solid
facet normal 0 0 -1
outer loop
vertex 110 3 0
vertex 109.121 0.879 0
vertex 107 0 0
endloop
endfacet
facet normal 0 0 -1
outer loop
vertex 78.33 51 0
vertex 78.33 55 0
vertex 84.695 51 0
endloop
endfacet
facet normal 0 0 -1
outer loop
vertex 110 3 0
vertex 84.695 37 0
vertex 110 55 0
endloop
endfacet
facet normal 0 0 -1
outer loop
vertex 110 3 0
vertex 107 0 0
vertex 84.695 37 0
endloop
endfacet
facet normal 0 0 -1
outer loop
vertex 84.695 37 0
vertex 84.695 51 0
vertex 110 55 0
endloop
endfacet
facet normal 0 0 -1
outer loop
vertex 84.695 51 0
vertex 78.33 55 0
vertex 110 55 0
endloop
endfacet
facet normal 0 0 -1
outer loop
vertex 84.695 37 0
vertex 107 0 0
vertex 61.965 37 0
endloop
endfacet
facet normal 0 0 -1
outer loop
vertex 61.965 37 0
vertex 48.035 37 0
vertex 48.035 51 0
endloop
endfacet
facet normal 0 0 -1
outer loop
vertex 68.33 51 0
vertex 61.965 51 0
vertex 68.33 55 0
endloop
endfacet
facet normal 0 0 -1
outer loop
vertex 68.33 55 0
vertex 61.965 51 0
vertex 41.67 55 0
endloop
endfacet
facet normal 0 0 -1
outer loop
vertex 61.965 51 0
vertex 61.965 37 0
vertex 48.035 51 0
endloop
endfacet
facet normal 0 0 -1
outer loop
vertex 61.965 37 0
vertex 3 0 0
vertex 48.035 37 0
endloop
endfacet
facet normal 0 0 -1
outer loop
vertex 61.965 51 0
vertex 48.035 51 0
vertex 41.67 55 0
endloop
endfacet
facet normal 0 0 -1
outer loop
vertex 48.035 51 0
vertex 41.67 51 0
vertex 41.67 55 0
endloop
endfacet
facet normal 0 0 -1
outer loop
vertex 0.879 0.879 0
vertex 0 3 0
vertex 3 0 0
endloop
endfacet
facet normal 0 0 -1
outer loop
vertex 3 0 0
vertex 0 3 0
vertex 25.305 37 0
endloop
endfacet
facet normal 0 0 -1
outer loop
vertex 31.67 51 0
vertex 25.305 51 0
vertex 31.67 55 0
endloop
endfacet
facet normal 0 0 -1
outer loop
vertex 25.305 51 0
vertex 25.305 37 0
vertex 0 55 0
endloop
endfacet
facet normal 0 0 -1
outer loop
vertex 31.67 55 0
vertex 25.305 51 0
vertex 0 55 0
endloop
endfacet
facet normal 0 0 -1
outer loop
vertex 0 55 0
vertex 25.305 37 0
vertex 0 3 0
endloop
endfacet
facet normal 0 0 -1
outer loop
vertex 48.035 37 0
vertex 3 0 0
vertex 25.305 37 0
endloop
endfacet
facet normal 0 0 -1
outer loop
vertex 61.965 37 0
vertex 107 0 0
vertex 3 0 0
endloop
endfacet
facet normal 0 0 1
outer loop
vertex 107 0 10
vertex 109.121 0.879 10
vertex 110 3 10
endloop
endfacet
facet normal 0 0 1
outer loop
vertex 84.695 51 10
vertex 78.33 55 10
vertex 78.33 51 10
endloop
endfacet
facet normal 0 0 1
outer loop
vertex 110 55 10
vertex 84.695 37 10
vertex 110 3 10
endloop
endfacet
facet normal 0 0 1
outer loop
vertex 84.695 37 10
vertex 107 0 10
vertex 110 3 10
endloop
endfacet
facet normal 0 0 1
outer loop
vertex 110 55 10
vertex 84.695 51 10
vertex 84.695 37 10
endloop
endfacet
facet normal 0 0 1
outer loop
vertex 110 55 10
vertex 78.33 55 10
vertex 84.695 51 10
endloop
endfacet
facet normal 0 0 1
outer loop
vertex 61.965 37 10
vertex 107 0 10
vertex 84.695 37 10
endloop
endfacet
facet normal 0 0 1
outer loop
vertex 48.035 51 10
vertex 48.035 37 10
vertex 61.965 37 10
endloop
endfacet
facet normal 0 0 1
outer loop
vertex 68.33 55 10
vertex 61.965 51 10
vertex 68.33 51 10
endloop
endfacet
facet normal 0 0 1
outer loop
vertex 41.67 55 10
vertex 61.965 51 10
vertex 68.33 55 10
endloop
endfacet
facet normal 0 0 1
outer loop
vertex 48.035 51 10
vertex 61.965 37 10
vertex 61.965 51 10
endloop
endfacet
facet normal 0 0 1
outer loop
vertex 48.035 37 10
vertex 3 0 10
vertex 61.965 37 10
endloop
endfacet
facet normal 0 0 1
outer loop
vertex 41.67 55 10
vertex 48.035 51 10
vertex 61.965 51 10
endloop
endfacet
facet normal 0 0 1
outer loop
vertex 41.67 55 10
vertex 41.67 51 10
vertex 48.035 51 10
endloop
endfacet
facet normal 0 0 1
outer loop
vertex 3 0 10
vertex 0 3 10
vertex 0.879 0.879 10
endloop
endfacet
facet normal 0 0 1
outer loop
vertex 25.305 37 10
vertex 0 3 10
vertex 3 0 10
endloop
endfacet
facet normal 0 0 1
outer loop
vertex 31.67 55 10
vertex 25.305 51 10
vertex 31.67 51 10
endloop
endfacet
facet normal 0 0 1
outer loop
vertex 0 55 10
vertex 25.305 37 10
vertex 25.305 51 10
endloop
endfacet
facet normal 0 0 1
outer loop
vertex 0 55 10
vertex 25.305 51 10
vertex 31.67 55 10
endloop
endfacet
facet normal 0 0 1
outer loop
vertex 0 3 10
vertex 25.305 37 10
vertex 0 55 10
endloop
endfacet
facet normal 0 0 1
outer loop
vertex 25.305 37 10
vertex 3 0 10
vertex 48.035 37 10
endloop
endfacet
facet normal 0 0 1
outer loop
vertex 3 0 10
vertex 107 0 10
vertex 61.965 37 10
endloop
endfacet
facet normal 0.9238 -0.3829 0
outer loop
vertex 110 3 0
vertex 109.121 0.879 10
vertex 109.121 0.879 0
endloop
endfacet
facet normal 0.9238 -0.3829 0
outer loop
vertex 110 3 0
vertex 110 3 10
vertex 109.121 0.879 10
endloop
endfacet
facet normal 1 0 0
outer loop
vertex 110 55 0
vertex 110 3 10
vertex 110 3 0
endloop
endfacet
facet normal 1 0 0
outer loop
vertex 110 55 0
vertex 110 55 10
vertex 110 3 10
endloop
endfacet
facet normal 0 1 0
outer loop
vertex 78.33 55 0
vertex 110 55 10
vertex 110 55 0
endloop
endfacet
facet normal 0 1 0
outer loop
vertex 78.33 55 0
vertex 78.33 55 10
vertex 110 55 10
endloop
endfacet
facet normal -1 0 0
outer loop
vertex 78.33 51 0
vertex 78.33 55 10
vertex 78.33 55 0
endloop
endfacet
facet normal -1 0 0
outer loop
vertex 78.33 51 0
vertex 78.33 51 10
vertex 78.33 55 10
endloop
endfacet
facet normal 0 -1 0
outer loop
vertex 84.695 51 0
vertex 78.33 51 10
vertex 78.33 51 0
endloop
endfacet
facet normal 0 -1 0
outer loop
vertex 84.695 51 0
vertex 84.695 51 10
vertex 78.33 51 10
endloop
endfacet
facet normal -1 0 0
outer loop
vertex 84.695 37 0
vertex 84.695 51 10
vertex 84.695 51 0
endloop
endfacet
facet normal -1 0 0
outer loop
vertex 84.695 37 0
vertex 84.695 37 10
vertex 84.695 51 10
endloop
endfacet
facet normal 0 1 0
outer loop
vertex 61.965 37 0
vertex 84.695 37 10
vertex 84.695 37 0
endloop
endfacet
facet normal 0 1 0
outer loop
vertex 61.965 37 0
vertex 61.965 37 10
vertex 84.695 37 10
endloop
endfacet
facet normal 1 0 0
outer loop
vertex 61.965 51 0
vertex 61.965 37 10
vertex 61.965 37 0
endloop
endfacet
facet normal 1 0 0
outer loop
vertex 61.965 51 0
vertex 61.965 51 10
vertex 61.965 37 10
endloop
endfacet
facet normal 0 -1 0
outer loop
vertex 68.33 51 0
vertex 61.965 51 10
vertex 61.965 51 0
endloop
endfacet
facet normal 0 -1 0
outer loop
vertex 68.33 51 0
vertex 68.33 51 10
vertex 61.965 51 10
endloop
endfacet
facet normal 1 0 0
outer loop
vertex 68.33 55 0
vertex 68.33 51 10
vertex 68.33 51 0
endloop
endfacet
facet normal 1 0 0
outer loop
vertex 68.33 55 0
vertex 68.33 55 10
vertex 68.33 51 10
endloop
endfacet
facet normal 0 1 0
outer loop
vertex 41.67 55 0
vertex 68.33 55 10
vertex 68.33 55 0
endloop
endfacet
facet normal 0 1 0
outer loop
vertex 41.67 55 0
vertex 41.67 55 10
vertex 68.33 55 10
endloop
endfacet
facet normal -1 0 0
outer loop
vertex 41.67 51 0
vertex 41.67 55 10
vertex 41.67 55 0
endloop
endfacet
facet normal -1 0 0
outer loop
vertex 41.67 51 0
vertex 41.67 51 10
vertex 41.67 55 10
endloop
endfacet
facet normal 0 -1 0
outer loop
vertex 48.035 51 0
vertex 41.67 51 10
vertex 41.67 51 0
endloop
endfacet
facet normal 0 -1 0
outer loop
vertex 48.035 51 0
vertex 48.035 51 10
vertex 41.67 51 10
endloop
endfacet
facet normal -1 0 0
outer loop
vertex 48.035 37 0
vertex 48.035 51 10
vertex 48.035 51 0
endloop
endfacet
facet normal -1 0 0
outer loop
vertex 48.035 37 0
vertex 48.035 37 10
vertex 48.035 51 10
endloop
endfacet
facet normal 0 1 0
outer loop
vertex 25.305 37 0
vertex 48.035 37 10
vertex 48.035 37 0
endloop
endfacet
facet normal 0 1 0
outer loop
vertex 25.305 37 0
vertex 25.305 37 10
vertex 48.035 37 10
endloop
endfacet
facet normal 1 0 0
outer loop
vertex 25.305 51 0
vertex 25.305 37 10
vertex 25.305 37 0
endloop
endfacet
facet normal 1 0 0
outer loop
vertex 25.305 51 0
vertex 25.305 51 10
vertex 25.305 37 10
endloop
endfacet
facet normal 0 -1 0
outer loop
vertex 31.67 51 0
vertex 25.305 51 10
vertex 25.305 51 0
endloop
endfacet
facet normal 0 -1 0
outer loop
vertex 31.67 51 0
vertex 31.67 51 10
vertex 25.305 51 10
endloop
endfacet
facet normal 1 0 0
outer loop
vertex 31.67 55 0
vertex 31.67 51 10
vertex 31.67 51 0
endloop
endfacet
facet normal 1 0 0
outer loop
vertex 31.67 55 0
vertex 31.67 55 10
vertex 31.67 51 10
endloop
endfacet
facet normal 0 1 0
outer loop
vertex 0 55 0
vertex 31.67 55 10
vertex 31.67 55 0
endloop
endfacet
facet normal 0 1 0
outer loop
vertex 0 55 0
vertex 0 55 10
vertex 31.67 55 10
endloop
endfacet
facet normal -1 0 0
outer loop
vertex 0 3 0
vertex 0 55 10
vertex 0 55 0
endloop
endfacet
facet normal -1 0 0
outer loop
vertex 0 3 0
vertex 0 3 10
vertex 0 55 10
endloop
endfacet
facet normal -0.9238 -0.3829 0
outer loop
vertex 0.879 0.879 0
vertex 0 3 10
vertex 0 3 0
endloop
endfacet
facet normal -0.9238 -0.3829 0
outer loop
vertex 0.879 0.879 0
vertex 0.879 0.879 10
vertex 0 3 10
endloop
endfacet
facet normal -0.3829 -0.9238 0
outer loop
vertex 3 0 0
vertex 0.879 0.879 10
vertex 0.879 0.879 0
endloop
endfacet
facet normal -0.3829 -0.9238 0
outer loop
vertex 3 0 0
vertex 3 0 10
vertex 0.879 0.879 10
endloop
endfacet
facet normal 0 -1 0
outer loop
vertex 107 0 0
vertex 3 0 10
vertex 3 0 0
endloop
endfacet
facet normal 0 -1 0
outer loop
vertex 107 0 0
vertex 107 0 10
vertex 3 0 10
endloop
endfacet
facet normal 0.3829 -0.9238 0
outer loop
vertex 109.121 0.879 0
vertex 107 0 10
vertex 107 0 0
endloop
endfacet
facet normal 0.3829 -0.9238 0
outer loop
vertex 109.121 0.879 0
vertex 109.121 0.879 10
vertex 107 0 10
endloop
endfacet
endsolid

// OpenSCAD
$fn = 32;

// ----------------------------------------------------------------------
// Window plate: 110 x 55 mm, 2 open windows
// ----------------------------------------------------------------------

// --- parameters (mm) ---
profile_height = 10;      // extrusion height
profile_points = 24;      // points of the closed outline

profile = [[0, 3], [0.879, 0.879], [3, 0], [107, 0], [109.121, 0.879], [110, 3], [110, 55], [78.33, 55], [78.33, 51], [84.695, 51], [84.695, 37], [61.965, 37], [61.965, 51], [68.33, 51], [68.33, 55], [41.67, 55], [41.67, 51], [48.035, 51], [48.035, 37], [25.305, 37], [25.305, 51], [31.67, 51], [31.67, 55], [0, 55]];  // single closed polygon, 24 points, counter clockwise

// --- the one profile operation ---
linear_extrude(height = profile_height) polygon(points = profile);
